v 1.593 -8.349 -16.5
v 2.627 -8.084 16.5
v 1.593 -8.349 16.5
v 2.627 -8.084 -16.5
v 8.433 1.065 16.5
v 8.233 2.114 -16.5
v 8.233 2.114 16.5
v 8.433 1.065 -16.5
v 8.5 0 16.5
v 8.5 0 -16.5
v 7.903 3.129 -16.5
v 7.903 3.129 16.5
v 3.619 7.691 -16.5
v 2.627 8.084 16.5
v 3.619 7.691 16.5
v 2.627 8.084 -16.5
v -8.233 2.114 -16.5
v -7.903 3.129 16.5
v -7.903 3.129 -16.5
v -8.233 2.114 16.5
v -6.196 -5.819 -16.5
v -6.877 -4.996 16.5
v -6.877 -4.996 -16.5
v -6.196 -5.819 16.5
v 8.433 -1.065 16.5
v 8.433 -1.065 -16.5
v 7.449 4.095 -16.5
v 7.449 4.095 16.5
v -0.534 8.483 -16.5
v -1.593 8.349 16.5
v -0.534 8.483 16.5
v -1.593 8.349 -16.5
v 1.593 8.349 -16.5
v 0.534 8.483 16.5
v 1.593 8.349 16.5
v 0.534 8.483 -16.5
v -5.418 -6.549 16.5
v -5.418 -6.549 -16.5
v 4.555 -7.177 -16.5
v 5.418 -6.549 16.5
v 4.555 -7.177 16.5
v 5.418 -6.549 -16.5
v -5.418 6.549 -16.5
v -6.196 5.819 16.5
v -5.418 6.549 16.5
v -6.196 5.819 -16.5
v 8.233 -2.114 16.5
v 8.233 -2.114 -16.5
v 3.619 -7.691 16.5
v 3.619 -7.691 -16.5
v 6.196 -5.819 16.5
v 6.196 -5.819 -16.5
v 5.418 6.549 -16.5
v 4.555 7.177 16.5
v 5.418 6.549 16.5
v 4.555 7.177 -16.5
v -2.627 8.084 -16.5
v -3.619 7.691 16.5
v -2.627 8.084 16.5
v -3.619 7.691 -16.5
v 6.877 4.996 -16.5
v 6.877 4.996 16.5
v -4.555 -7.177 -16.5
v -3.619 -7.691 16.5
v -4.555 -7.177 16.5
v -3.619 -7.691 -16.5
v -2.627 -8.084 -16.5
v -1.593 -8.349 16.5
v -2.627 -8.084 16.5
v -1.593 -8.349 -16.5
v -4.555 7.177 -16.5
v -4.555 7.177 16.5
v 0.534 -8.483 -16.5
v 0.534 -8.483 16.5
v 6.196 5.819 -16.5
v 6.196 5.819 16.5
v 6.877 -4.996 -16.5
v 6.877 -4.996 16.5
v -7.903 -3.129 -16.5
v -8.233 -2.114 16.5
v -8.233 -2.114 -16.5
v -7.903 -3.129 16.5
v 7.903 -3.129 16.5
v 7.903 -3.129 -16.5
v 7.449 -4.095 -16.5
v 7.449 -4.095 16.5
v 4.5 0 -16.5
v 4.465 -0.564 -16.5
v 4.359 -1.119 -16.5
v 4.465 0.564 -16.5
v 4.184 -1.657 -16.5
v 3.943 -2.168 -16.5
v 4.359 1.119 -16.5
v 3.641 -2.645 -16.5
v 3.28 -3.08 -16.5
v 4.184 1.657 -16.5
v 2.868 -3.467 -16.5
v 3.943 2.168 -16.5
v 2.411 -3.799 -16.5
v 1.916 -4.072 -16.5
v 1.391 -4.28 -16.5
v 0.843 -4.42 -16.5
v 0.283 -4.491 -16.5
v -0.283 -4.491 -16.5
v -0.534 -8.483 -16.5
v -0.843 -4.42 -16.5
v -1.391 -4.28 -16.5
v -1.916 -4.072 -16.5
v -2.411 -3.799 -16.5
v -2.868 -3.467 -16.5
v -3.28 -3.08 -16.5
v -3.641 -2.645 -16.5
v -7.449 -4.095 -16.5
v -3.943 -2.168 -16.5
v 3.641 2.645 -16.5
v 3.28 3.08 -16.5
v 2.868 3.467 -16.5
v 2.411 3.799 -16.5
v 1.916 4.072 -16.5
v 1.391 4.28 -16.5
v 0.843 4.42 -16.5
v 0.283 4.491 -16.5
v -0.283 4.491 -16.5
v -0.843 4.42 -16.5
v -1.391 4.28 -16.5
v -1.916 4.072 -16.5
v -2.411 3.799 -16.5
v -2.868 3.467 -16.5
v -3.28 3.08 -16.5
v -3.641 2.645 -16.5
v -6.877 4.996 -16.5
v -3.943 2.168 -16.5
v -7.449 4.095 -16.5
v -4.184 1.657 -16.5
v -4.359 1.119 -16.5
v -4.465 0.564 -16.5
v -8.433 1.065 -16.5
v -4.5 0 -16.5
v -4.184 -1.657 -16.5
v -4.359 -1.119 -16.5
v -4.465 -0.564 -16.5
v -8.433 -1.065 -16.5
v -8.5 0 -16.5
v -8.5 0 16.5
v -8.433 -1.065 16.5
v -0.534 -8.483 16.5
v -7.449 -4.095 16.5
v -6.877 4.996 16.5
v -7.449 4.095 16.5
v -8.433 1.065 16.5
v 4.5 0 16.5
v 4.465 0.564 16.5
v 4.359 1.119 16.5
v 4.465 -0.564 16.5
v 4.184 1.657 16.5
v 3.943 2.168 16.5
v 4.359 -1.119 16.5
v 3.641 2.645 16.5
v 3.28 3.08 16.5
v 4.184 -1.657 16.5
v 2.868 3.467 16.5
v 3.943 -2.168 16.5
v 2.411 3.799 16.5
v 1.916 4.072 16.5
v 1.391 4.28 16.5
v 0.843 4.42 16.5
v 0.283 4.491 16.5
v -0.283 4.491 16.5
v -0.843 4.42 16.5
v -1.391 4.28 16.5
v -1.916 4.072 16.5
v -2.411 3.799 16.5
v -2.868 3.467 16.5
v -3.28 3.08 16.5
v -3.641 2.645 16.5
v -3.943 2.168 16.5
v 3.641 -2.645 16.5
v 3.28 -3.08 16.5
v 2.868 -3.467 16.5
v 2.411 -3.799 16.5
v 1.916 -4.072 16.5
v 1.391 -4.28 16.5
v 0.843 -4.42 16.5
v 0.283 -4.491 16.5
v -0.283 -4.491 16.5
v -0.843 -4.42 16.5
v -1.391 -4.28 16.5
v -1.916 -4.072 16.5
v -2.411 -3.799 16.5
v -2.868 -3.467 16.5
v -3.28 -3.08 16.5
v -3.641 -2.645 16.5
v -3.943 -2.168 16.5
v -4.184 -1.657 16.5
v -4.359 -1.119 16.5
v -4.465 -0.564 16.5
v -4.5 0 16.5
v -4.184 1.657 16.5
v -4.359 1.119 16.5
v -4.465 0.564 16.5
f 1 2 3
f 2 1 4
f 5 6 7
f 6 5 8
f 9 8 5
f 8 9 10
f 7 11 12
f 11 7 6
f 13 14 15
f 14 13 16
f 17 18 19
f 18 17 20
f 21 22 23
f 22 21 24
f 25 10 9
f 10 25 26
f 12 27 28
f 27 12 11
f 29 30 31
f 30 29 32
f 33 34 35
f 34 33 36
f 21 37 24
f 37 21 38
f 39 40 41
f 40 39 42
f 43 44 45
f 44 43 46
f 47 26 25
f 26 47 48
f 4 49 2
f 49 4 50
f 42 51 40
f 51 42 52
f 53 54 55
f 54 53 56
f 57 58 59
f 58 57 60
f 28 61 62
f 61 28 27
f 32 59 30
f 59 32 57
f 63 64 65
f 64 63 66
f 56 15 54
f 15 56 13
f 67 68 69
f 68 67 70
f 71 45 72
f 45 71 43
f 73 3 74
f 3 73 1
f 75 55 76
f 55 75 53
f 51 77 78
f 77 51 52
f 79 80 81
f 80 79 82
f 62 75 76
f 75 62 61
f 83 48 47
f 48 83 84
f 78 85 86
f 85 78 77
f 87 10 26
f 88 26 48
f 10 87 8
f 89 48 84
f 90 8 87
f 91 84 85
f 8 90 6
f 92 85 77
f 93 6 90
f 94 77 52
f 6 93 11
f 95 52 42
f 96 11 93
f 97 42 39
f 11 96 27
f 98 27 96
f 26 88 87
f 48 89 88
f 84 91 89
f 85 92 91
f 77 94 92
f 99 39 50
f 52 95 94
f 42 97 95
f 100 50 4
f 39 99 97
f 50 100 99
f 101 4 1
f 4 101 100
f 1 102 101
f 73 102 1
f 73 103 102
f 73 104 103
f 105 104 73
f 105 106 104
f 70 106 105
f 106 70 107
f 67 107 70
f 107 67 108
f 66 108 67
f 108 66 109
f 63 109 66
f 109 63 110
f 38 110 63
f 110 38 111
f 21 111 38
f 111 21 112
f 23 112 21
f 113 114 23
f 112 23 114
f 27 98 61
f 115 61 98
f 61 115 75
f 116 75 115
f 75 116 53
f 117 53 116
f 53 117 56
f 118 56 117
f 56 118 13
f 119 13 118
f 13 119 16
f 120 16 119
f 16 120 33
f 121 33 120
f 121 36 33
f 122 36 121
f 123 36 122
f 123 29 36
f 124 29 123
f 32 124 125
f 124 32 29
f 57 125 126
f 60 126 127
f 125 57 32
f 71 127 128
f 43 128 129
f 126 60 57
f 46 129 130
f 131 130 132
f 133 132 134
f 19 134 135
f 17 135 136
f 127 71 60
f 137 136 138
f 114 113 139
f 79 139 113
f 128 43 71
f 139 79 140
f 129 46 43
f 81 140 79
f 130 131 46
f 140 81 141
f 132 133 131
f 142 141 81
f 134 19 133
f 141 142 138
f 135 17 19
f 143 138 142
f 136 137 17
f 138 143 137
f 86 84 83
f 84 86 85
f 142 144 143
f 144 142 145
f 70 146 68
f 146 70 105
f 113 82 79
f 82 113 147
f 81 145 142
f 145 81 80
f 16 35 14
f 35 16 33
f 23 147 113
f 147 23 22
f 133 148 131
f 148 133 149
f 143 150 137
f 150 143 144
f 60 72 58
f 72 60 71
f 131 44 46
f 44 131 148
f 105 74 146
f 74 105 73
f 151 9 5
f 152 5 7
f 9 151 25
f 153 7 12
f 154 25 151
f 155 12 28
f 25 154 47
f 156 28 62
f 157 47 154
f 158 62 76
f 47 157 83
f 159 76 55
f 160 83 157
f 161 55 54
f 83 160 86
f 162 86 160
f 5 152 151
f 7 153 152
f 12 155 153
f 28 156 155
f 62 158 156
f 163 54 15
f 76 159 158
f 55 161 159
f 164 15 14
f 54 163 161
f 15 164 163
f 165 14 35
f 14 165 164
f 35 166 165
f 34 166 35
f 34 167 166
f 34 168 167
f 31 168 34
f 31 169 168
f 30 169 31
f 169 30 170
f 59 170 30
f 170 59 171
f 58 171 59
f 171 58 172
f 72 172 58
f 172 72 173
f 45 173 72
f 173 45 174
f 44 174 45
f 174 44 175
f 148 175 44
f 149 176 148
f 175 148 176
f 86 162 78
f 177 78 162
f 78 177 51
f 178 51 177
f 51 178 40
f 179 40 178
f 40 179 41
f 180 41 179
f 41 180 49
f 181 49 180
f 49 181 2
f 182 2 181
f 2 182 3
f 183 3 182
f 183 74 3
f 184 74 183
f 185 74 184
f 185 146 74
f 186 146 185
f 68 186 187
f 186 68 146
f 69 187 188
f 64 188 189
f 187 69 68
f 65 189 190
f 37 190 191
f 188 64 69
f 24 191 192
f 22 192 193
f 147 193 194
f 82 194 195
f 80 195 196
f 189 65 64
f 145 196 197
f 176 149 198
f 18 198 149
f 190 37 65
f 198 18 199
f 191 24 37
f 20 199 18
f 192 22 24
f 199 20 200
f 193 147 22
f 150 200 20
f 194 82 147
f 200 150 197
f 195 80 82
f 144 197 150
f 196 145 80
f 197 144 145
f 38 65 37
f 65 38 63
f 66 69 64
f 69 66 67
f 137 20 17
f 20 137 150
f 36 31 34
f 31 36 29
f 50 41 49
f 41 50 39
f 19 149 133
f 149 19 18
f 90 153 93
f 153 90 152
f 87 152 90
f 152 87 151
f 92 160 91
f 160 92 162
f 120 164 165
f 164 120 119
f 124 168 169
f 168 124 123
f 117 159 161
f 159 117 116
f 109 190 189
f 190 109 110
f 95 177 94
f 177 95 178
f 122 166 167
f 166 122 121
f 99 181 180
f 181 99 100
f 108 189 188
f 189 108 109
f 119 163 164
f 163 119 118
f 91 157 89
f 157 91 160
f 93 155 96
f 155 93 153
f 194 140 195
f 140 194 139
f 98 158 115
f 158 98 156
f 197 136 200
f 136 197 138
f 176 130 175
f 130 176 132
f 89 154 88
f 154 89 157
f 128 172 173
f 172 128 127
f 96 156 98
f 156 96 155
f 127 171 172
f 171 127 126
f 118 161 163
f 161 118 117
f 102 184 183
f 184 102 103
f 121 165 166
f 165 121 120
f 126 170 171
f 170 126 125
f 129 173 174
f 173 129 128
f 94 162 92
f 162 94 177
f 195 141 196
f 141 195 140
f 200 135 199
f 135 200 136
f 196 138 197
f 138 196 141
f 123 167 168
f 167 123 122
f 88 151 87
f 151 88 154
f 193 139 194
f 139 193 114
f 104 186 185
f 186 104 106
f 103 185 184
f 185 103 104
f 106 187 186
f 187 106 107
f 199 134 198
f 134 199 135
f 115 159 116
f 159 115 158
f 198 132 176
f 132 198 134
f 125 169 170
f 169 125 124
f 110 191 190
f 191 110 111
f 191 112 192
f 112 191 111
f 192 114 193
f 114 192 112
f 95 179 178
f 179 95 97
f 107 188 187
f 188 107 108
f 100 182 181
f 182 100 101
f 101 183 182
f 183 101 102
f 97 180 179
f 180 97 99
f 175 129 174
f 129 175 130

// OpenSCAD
$fn = 50;


difference() {
	union() {
		translate(v = [0, 0, -16.5000000000]) {
			cylinder(h = 33, r = 8.5000000000);
		}
	}
	union() {
		translate(v = [0, 0, -100.0000000000]) {
			cylinder(h = 200, r = 4.5000000000);
		}
	}
}
